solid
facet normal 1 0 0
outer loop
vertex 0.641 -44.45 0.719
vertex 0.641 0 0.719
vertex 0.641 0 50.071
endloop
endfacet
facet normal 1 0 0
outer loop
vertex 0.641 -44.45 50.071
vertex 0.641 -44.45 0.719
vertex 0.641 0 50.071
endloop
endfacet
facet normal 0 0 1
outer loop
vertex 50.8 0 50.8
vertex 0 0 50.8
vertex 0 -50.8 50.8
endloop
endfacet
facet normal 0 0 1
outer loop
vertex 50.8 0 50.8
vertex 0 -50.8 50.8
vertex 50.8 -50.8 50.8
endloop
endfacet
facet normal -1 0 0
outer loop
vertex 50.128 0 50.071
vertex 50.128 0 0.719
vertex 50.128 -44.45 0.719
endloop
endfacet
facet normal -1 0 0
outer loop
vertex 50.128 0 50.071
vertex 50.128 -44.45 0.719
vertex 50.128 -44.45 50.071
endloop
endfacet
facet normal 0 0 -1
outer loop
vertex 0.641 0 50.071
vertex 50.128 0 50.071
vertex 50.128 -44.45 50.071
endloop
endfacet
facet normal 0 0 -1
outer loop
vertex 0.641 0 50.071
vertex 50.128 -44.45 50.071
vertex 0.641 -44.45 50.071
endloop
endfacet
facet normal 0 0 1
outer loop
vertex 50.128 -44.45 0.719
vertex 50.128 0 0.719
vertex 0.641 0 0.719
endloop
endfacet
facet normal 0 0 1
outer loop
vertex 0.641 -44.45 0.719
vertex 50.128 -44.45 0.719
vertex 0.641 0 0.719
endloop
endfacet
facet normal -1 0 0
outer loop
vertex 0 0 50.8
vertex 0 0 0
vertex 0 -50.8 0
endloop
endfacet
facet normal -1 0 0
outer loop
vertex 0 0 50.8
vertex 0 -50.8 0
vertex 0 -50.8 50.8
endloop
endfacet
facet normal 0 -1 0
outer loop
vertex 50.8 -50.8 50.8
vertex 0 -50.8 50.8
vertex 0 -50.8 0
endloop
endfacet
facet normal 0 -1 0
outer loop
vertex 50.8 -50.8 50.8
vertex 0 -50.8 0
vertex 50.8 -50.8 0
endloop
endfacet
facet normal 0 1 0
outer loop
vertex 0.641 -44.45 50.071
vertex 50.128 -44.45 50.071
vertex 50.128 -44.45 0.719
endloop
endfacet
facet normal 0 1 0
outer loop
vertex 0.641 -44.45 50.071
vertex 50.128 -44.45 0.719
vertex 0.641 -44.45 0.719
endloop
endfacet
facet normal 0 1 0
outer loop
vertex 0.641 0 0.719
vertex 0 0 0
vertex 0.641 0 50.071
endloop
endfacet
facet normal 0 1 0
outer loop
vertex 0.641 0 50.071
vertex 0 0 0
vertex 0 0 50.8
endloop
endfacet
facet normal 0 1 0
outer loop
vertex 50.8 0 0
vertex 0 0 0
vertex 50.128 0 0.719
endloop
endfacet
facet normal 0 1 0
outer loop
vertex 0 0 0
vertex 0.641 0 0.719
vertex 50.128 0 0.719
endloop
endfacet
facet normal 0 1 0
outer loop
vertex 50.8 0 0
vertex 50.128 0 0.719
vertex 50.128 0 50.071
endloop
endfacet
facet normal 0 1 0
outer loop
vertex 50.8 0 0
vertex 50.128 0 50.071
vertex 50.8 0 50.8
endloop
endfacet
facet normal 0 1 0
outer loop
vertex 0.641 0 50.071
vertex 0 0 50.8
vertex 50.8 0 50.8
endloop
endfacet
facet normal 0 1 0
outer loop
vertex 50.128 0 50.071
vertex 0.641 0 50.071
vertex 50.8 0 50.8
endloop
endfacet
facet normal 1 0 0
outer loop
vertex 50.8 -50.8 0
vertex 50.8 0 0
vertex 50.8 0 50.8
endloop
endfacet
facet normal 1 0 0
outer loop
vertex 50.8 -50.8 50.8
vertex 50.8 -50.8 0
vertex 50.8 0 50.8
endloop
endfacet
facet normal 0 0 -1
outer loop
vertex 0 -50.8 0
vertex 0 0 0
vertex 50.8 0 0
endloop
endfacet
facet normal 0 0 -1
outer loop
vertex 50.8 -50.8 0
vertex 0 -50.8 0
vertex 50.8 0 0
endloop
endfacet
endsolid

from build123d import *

# Parameters (mm, degrees)
F0_W       = 50.8
F0_H       = 50.8
F1_DEPTH   = 50.8
F2_W       = 49.4867833913
F2_H       = 49.351756752
F1_FACE1_W = 50.8
F1_FACE1_H = 50.8
F3_DEPTH   = 25.4
F4_DEPTH   = 69.85


with BuildPart() as f1:
    # F0 (on Front) → F1 (new body)
    with BuildSketch(Plane.XZ):
        with Locations((25.4, 25.4)):
            Rectangle(F0_W, F0_H)
    extrude(amount=F1_DEPTH)

    # F2 (on face) + F1_face1 (on face) → F3 (join)
    with BuildSketch(Plane(origin=(0, 0, 0), x_dir=(-1, 0, 0), z_dir=(0, 1, 0))):
        with Locations((-25.3845243424, 25.394623488)):
            Rectangle(F2_W, F2_H)
    with BuildSketch(Plane(origin=(25.4, -50.8, 25.4), x_dir=(1, 0, 0), z_dir=(0, -1, 0))):
        Rectangle(F1_FACE1_W, F1_FACE1_H)
    extrude(amount=F3_DEPTH, dir=(0, 1, 0))

    # F4 (cut): a face of the model
    f4_faces = [f1.faces().sort_by_distance(p)[0] for p in [
        (25.3845243424, 25.4, 25.394623488),
    ]]
    extrude(f4_faces, amount=-F4_DEPTH, mode=Mode.SUBTRACT)


solid = f1.part
